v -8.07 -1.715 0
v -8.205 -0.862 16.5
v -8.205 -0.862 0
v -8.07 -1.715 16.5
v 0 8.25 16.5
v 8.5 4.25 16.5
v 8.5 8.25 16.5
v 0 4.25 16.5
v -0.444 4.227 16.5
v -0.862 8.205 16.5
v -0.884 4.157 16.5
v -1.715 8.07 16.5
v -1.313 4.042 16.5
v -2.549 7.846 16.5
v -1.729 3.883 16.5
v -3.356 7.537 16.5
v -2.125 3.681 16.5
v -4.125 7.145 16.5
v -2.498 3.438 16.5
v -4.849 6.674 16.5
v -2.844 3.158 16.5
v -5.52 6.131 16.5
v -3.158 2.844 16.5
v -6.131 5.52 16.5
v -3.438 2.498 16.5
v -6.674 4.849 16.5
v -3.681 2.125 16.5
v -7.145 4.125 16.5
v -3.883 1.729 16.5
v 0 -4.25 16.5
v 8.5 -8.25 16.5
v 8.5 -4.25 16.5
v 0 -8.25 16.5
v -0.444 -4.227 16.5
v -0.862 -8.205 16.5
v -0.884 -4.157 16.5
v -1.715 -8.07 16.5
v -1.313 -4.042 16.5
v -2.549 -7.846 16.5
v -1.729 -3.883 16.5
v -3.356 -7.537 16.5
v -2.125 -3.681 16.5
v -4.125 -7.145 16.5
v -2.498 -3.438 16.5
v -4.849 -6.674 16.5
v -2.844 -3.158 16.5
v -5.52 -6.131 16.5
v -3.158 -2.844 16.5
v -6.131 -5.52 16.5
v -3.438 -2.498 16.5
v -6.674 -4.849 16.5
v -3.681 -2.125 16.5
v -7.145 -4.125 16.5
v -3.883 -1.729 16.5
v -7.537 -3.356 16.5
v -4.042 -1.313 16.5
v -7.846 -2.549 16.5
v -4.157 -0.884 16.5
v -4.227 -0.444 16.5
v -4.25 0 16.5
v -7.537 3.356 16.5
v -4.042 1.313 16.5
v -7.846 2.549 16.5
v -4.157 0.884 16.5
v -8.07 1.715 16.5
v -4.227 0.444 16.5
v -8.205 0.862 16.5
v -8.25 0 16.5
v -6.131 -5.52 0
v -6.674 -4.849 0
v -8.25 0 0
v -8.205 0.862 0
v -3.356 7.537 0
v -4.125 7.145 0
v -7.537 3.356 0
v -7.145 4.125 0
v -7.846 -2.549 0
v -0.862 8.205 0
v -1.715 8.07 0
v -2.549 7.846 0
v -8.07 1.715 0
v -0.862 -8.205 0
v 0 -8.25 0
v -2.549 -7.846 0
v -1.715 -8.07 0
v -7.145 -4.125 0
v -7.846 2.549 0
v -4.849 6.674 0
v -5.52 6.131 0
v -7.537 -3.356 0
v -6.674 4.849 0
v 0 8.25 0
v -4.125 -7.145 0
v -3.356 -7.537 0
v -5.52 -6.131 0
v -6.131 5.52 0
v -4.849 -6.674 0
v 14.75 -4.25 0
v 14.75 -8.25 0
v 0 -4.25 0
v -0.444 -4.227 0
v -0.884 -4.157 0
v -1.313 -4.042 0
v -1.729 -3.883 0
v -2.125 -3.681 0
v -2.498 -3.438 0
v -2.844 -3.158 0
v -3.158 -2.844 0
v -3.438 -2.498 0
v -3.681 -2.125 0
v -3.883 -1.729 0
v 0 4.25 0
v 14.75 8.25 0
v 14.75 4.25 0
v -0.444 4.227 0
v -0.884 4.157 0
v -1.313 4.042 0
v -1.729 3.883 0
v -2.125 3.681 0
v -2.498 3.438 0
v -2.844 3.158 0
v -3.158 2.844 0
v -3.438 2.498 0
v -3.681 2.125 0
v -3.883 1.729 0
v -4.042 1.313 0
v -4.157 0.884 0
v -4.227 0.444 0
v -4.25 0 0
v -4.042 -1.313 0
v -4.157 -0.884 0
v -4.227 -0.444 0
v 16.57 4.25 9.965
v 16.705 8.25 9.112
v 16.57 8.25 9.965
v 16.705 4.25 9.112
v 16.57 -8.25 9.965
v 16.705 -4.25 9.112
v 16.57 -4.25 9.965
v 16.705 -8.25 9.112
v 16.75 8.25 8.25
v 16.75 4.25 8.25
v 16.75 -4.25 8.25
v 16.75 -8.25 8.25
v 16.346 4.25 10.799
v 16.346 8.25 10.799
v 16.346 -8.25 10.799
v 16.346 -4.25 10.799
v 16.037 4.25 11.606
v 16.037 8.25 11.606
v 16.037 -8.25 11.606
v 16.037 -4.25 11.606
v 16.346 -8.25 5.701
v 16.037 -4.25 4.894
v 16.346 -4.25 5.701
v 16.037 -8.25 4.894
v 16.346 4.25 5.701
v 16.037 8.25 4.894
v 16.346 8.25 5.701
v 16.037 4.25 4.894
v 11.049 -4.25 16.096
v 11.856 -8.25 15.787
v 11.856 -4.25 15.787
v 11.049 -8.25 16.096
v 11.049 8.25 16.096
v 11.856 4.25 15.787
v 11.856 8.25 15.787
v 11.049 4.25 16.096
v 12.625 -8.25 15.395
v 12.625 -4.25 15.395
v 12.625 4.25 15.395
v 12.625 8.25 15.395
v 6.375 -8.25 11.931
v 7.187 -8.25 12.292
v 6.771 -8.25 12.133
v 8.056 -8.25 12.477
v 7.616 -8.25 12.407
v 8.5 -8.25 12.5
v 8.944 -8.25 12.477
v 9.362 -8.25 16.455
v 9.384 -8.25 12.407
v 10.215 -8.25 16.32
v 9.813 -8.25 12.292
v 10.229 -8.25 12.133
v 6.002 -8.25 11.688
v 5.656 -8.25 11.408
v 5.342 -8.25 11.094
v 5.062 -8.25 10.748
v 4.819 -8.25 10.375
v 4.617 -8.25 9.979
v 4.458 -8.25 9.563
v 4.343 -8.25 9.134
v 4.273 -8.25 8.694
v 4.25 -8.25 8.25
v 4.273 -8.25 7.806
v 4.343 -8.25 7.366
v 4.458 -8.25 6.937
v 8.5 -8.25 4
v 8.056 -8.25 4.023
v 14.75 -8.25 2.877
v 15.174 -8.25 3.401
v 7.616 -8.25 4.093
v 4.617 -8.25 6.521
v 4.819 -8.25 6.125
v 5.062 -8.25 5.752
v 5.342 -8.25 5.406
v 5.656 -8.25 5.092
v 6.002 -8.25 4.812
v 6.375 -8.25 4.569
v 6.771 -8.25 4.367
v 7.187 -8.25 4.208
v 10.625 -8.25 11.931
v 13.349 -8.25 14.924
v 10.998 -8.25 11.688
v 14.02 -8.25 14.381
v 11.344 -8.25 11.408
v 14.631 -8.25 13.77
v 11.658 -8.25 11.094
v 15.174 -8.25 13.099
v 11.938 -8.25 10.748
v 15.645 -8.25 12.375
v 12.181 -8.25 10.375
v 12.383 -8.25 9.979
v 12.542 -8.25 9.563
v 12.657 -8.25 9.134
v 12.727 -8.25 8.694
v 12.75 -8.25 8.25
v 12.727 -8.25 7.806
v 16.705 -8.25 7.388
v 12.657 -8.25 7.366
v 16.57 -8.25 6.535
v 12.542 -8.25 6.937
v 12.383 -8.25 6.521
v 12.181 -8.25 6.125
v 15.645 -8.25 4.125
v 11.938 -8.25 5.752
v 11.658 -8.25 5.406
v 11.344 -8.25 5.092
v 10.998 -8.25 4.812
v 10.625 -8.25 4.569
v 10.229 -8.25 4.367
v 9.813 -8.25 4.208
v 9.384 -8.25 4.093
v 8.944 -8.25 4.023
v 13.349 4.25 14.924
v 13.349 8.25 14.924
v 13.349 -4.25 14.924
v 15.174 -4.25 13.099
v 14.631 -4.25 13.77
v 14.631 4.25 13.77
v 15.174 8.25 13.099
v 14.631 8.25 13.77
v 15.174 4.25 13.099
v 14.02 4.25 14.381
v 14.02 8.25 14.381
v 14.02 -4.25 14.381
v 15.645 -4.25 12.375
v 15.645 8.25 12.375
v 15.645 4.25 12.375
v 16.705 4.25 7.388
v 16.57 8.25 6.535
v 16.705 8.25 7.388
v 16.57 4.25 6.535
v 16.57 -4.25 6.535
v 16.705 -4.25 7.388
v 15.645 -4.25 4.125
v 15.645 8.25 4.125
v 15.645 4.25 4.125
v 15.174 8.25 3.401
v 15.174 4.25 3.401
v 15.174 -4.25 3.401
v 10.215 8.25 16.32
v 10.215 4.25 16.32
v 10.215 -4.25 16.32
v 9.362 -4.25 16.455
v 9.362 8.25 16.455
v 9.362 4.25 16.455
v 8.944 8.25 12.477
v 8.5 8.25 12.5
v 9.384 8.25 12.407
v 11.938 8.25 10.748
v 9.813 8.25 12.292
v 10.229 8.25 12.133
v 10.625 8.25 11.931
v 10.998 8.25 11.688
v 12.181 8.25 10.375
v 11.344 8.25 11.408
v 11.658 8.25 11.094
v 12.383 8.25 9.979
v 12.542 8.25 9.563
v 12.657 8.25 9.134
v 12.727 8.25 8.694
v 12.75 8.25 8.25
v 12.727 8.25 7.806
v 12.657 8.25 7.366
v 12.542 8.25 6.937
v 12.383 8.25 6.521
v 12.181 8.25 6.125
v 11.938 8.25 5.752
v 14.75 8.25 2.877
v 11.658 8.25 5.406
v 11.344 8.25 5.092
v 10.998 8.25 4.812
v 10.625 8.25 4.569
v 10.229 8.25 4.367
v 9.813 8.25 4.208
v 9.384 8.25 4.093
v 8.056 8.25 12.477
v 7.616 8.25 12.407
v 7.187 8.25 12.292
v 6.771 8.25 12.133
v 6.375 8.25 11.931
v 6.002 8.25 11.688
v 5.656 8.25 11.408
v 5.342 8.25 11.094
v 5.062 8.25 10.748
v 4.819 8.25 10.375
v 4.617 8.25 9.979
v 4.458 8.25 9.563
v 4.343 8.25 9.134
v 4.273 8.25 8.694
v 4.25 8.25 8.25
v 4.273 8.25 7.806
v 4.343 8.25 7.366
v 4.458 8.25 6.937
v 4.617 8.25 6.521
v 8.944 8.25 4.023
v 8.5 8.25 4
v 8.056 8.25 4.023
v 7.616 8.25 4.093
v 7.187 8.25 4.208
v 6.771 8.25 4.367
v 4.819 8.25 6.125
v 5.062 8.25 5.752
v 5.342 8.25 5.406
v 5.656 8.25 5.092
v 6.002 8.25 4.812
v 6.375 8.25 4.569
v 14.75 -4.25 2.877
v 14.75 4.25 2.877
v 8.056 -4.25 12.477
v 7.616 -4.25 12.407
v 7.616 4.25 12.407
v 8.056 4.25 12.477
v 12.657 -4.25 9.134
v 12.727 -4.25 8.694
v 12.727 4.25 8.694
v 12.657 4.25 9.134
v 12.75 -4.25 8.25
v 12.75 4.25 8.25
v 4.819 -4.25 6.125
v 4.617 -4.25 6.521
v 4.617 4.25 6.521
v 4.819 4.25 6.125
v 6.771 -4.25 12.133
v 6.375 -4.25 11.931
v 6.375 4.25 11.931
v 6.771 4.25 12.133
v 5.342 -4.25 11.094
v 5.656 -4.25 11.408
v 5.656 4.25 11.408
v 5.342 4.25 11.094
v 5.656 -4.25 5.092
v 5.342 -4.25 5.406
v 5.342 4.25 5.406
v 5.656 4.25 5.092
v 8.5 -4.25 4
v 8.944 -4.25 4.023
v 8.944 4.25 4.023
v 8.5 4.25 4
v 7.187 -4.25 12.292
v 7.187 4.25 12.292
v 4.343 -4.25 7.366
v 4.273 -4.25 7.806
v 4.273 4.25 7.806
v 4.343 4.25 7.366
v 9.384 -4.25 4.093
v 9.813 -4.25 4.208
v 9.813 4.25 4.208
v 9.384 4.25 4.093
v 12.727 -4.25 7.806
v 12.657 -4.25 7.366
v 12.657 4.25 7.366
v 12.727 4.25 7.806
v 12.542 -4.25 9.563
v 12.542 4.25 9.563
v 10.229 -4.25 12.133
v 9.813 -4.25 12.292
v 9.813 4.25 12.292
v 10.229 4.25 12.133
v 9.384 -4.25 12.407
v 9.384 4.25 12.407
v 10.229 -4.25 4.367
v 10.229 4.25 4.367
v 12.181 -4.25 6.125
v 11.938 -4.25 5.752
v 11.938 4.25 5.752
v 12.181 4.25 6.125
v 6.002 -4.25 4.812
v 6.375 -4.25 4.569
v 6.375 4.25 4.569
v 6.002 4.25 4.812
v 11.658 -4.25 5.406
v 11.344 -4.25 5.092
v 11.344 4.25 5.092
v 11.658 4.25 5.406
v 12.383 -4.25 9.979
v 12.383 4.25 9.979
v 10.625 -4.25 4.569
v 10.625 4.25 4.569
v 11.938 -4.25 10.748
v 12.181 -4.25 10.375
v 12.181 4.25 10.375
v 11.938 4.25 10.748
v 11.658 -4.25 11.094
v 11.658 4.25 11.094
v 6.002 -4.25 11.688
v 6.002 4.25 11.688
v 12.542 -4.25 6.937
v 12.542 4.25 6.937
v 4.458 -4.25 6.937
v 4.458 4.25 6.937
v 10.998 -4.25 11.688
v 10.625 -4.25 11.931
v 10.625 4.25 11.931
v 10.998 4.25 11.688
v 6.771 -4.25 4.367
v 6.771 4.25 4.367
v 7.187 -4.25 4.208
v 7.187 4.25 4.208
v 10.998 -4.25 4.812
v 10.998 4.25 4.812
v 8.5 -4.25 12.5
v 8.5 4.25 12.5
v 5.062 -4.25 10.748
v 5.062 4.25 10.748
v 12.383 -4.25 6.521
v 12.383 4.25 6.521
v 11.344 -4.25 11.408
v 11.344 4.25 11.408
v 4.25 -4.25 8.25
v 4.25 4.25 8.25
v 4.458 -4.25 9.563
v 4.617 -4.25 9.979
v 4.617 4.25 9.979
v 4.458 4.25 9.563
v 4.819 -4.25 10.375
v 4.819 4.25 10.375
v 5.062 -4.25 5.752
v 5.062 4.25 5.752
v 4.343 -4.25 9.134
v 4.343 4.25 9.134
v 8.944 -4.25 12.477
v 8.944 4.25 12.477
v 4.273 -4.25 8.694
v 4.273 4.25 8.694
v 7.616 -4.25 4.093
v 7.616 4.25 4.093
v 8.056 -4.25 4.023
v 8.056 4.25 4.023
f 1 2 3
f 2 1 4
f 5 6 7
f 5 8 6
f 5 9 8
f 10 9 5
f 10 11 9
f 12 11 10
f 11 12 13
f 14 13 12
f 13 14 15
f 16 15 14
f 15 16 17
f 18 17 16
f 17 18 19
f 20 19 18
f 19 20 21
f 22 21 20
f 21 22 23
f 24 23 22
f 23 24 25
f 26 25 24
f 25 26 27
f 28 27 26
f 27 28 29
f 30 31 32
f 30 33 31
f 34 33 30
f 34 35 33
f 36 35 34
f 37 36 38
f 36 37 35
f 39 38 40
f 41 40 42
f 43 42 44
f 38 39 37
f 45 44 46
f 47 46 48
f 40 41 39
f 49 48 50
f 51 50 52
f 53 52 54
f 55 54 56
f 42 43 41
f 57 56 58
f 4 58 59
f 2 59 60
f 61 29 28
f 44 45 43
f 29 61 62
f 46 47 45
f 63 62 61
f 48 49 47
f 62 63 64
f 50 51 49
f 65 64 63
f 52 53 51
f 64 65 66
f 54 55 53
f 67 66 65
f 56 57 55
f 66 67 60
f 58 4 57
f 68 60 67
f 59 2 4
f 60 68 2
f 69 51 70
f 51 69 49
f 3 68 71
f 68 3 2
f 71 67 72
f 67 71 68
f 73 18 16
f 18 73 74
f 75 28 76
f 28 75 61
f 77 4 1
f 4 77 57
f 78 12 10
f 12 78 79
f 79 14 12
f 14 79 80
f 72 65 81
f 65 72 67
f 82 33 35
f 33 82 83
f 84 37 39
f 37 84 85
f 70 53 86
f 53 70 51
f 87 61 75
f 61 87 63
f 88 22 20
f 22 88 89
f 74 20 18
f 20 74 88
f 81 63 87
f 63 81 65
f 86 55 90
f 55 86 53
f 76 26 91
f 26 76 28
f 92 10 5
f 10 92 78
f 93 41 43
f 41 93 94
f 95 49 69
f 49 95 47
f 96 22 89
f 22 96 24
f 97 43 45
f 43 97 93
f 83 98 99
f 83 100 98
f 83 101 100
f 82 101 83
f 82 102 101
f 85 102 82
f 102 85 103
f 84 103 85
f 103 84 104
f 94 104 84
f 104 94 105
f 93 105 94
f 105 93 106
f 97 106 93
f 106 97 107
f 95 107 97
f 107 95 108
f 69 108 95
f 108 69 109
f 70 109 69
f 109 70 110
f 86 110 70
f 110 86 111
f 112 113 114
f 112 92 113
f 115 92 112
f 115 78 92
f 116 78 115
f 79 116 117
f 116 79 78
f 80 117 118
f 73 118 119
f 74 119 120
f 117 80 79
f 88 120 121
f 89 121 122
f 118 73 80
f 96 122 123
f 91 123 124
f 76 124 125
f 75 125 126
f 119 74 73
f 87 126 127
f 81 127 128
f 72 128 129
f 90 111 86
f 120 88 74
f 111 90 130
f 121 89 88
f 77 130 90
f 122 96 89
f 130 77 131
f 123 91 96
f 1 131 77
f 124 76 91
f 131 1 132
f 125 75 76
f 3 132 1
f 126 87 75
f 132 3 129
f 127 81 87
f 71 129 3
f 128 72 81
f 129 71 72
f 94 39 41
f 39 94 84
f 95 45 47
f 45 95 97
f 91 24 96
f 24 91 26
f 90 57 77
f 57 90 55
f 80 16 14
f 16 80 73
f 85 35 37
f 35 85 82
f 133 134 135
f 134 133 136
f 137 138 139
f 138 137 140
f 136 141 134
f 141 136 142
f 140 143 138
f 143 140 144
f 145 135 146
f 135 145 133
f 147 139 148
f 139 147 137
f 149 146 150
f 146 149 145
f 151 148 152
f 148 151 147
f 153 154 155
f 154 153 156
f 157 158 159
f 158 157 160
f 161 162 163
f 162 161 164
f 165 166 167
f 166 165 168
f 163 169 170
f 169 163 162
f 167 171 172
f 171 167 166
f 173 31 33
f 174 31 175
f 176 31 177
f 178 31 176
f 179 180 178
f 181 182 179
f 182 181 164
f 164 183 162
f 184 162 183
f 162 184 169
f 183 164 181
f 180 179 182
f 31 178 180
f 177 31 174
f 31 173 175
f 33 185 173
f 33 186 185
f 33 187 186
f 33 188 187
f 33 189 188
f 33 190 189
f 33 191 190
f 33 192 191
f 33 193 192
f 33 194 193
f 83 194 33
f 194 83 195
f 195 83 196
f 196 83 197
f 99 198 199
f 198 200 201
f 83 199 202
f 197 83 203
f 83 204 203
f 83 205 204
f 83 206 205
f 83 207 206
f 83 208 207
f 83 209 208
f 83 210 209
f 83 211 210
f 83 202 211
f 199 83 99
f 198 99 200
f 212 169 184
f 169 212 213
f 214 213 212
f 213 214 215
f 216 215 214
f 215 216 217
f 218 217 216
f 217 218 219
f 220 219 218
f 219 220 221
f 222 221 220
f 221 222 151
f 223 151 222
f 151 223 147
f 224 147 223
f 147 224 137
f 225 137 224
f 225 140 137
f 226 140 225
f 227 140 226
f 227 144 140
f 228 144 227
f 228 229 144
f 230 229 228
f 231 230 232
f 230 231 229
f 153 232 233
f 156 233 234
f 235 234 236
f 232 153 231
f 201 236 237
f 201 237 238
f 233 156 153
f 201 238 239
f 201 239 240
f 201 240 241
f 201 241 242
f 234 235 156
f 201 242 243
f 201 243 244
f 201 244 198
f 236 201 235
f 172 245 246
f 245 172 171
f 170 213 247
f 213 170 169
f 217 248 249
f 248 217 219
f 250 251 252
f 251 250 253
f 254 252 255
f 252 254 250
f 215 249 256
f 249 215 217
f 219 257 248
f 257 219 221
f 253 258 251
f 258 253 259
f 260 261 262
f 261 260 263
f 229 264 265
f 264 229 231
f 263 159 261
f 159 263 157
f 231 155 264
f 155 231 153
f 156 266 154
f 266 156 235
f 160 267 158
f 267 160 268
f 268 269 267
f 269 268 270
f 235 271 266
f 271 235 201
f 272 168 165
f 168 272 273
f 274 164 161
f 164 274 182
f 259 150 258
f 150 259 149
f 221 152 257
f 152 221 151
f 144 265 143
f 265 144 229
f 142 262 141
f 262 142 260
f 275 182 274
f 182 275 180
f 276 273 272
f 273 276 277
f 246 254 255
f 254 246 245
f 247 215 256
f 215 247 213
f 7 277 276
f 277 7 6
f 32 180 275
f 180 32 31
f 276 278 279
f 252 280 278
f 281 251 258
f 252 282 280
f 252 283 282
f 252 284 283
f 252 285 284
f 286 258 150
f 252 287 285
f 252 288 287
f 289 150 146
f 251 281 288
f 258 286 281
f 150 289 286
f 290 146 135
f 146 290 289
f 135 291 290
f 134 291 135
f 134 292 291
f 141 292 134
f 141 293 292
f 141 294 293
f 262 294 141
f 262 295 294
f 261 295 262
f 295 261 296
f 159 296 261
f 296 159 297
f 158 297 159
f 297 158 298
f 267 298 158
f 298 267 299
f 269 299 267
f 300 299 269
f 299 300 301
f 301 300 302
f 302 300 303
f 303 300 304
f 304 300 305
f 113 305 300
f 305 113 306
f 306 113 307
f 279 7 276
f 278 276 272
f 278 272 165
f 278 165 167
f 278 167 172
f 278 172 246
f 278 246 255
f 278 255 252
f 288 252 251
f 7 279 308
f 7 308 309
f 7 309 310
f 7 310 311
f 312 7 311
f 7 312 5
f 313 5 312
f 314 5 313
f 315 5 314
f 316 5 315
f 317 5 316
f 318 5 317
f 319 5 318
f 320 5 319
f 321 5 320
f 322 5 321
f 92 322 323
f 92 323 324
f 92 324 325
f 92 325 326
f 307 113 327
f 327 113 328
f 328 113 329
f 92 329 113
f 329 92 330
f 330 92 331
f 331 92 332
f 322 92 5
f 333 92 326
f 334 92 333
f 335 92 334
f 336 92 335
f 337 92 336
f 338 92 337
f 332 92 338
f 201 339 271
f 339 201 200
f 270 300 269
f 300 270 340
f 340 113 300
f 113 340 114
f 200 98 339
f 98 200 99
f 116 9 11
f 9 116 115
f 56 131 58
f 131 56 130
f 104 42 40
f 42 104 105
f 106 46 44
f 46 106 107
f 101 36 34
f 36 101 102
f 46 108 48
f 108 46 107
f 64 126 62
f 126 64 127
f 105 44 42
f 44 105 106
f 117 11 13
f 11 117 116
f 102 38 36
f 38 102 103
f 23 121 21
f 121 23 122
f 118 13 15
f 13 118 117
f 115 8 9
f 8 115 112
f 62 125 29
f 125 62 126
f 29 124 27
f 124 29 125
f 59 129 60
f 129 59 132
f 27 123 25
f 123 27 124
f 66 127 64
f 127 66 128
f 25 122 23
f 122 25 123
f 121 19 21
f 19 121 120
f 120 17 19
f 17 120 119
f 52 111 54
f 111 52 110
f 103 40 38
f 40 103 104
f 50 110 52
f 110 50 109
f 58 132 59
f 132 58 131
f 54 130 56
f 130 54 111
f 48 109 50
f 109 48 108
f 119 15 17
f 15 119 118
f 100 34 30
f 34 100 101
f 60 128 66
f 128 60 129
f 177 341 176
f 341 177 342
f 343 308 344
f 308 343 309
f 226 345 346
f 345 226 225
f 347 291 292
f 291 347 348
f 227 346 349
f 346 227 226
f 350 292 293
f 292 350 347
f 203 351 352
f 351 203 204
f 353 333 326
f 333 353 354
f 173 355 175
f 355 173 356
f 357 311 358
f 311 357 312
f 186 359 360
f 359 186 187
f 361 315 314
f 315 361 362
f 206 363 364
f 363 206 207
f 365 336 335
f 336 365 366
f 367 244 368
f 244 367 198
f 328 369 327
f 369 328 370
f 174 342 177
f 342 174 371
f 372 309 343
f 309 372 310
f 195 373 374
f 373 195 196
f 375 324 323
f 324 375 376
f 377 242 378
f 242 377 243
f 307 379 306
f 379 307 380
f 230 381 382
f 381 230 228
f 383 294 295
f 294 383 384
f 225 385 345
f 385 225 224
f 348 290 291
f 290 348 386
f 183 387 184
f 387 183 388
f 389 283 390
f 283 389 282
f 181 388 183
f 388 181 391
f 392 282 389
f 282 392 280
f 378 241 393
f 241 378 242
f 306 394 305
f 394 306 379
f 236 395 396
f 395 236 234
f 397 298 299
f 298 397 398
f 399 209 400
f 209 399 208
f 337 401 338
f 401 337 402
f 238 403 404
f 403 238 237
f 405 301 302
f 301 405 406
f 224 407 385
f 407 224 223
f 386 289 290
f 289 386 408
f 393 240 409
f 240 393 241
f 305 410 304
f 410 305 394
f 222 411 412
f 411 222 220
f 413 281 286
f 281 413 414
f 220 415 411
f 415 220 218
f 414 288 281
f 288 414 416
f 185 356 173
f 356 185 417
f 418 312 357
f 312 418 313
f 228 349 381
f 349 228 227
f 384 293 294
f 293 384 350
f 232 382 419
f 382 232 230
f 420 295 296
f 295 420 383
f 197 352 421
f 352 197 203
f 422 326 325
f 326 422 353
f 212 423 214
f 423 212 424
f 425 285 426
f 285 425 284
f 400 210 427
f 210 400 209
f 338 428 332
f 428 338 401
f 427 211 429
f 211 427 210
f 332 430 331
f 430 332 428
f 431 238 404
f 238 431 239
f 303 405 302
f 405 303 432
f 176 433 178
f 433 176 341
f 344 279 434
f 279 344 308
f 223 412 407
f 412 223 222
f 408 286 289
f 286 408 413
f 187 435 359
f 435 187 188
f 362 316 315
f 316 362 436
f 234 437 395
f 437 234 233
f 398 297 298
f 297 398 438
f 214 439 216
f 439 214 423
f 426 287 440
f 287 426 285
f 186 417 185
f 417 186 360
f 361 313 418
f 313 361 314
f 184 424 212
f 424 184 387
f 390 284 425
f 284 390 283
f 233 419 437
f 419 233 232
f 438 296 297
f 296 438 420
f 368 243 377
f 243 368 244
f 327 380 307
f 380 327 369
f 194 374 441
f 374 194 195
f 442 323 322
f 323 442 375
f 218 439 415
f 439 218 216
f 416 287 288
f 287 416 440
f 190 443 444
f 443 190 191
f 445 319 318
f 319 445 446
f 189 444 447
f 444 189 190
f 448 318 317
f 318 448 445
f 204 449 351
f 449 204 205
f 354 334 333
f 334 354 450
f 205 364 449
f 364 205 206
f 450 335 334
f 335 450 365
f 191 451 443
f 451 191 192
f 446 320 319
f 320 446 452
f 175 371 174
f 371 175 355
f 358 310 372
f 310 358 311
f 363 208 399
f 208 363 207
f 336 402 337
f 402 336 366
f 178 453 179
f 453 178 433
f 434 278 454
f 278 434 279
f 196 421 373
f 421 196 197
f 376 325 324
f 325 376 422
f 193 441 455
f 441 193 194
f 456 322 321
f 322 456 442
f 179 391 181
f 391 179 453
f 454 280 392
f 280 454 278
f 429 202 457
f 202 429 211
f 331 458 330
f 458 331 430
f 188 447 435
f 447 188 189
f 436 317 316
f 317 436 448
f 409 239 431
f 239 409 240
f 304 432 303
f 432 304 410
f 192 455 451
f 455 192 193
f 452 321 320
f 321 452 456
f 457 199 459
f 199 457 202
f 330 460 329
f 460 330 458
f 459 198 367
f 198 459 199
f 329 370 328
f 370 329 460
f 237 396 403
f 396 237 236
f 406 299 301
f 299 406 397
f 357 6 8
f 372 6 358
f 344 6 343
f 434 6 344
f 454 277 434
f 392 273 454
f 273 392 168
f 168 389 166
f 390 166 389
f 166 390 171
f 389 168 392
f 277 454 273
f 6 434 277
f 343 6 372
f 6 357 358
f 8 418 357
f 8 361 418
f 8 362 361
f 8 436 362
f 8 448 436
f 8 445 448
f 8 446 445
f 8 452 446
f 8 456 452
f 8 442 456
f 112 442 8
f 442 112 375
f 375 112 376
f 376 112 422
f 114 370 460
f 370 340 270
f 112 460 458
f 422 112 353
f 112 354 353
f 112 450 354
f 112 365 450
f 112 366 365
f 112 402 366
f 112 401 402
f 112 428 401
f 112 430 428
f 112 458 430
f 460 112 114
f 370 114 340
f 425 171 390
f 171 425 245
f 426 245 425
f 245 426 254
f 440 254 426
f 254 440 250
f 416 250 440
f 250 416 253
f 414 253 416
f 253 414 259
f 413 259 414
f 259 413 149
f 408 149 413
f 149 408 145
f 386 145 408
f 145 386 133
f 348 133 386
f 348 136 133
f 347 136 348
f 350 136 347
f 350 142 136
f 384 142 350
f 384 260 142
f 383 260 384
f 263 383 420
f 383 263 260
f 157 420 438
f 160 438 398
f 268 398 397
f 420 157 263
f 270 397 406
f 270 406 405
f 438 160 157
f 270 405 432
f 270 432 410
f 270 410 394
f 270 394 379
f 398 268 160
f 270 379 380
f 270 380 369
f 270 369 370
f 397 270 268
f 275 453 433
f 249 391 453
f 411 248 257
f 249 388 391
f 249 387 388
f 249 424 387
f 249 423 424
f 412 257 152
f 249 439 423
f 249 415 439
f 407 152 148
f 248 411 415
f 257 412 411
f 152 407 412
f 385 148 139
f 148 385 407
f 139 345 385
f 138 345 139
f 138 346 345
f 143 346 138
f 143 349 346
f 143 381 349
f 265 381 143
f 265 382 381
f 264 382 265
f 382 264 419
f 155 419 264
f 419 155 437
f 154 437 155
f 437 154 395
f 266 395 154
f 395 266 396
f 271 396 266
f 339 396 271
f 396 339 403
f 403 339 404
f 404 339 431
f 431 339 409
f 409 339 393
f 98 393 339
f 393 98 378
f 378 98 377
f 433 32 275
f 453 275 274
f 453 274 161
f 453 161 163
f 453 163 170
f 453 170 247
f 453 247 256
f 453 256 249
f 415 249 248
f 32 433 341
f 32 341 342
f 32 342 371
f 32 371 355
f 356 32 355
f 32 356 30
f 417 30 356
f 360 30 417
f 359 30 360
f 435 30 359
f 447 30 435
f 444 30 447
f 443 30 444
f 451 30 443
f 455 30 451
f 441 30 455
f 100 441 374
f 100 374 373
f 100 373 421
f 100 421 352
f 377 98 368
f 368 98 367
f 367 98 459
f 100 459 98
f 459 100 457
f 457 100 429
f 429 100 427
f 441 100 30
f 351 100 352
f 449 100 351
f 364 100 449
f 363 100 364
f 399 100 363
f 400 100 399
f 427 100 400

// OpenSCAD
// file: config.scad
// This is the config for an M8 Mendel sized printer.

//Constants (These are used throughout the whole printer)
frameroddia = 8.5; //the frame rod diameter
smoothroddia = 8.5; //the smooth rod diameter
bushingod = 16; //The prusabushing OD, you can change this to 15 to use LM8UU linear bearings 
bushingheight = 11;
tapsize = 7; //The size of the hole before tapping. 7mm seems to work well.

nemasize = 1.7; //Nema Size (in imperial)
motorcenter = 23; //center hole size for the motor. If your motor center flange is smaller you can beef up parts this way. 
motorshaftdia = 5; // Motor shaft diameter
motorcenterwall = 5;
motorbody = 43;

pulleypitch = 5;
pulleyteeth = 8;
pulleydia = 12; // this will be replaced by the above soon

/* The Mixtape Mendel uses two types of fasteners. One is the "primary" type, which is the larger type that builds the structure,
 which was profiled above as "frameroddia, etc..". In the case of the Mendel, it is M8 threaded rod (Huxley, M6). It also uses "Secondary" hardware. This is a smaller screw used to retain tool heads, attach motors and lock pulleys on shafts. In the case of Mendel this is M3 or M4. M3 is preferred as it is cheaper. Tapping is quite the challenge though. 
*/
nutheight = 7; //Primary
nutdia = 14.8; //Primary
secscrewdia = 4; //secondary 
secscrewtap = 2.5; // secondary

beltthick = 2; //Thickness of the timing belt
beltwidth = 7; // Belt width, used for the y bed clamps so can be a little bugger than actual

mdfthick = 6; //thickness of MDF (You can use other wood, acrylic, lexan, etc)

bearingid = 8; // 608
bearingod = 22; // 608
bearinginnerrace = 12; // the amount of the inner race diameter exposed

tapping = true; //turn tapping on/off, not implemented yet. (Version 0.3 might implement this) Version 0.2 has tapping by default right now
layerheight = 0.32; //skeinforge/slicer layer height, used for the idler wasers right now. 

//Beef/tab/wall
motortabwall = 2.5;

//Frame Vertex
vertexwall = 3;
triangle = 60; // the angle the bottom vertexes have relative to horizontal

//Y Motor Mount
ymountthick = 9;
ywallmulti = 2; //the wall thickness multiplier for the bits that interface with the frame rod

//Y Belt Clamps
clampholewall = 3;
	//(bushingod-pulleydia)/2

//Bar Clamps
barclampwall = 4;

//Top Piece
toppiecethick = 8;
toprodwall = 4;
toprodspacing = 72;
siderodwall = 4;

// X End Pieces
xrodspacing = 50; //rod spacing center to center
nutwall = 3; //wall thickness around nut and bushing
towergap= 10; // 0.75 diameter wrap should be ok i think. Make a flag for full wrap and no square for bushings/linear bearings maybe?
//Motor
motorinterface = 6; //thickness of the motor mount (6 works well, need to decouple from top piece)

//X Carriage 
carriagewidth = 50;
bushingwall = 3;
backwall = 5;
tooldia = 17;
platformthick = 7;
platformextension = 40; 
clampthick = 4; //The two pieces that clamp around the belt

//Z Coupler
couplerwall = 4;
couplerheight = 34; // Make this double 3/4 your shaft length
 
//Extruder (Plastic Pusher)
extruderthick = 5;
bowdencabledia = 4;
bowdenwall = 3;
idlerwall = 2;
pinchwheeldia = 8;

//Utility Clamp 
utilityclampwall = 3;

//Groove Mount
	//Default is pretty good for MakerGear insulators
groovedia = 12;
grooveheight = 4.5;

//pen holder 
penwall = 3 ;
shaftheight = 30;
// main file
/*
Copyright (C) 2011  Steve Kelly

This program is free software; you can redistribute it and/or
modify it under the terms of the GNU General Public License
as published by the Free Software Foundation; either version 2
of the License, or (at your option) any later version.

This program is distributed in the hope that it will be useful,
but WITHOUT ANY WARRANTY; without even the implied warranty of
MERCHANTABILITY or FITNESS FOR A PARTICULAR PURPOSE.  See the
GNU General Public License for more details.

You should have received a copy of the GNU General Public License
along with this program; if not, write to the Free Software
Foundation, Inc., 51 Franklin Street, Fifth Floor, Boston, MA  02110-1301, USA.
*/

include <config.scad>;

$fn = 60;

difference() {
	union() {
	cylinder(r = smoothroddia/2+barclampwall, h=frameroddia+barclampwall*2);
	translate([smoothroddia/2+frameroddia/2,smoothroddia/2+barclampwall,frameroddia/2+barclampwall])rotate([90,0,0])cylinder(r = frameroddia/2+barclampwall, h=smoothroddia+barclampwall*2);
	translate([0,-smoothroddia/2-barclampwall,0])cube([frameroddia+smoothroddia/2+barclampwall/2, smoothroddia+ barclampwall*2, frameroddia/2 + barclampwall]);
	translate([0,-smoothroddia/2-barclampwall,0])cube([frameroddia/2+smoothroddia/2, smoothroddia+ barclampwall*2, frameroddia + barclampwall*2]);		
	}
translate([0,0,-1])cylinder(r = smoothroddia/2, h=frameroddia+barclampwall*2+2);	
translate([smoothroddia/2+frameroddia/2,smoothroddia/2+barclampwall+1,frameroddia/2+barclampwall])rotate([90,0,0])cylinder(r = frameroddia/2, h=smoothroddia+barclampwall*2+2);
translate([0,-smoothroddia/2,-1])cube([frameroddia+smoothroddia/2+barclampwall, smoothroddia, frameroddia + barclampwall*2+2]);
}
